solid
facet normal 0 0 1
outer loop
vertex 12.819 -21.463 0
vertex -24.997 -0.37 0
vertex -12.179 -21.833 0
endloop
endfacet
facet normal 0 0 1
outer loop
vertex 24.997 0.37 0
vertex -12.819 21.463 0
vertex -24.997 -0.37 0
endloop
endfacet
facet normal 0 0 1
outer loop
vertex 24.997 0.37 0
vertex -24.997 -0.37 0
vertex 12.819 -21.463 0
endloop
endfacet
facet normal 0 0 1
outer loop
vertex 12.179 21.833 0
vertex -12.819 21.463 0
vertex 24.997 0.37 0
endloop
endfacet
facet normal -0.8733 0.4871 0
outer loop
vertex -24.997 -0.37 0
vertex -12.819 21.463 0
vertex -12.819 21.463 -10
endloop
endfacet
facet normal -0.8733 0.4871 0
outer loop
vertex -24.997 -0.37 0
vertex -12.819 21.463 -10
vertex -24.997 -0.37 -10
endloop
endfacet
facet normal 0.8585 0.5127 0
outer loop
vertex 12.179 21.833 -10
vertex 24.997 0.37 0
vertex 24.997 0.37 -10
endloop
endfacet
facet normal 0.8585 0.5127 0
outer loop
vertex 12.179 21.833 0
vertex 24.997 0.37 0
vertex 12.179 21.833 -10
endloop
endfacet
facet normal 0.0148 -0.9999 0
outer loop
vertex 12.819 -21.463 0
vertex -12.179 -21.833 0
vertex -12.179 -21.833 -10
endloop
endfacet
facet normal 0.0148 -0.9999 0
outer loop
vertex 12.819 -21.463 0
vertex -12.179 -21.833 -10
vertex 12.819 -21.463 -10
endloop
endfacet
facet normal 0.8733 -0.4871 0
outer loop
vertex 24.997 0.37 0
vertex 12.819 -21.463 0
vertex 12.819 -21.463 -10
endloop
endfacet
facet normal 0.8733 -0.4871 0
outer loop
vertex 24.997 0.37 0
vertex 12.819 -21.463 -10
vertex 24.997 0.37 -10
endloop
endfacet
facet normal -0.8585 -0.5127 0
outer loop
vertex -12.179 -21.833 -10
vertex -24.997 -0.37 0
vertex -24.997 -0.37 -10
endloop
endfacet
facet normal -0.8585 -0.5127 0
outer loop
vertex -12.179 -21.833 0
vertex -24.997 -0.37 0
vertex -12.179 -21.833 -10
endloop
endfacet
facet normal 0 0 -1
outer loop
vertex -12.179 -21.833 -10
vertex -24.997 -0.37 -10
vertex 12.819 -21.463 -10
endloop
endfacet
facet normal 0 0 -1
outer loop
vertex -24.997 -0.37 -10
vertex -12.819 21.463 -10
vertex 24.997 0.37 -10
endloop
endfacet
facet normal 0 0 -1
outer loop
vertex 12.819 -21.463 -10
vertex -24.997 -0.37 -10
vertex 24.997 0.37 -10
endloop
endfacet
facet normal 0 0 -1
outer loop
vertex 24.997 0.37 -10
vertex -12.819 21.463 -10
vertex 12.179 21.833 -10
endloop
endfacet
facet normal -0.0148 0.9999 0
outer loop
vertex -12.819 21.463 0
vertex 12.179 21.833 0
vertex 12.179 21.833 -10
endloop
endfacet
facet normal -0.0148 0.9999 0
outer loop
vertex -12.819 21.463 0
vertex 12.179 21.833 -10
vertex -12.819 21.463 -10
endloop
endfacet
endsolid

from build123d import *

# Parameters (mm, degrees)
F1_DEPTH = 10


with BuildPart() as f1:
    # F0 (on Top) → F1 (new body)
    with BuildSketch(Plane.XY):
        Polygon((24.997267, 0.369631), (12.178524, 21.833084), (-12.818743, 21.463453), (-24.997267, -0.369631), (-12.178524, -21.833084), (12.818743, -21.463453), align=None)
    extrude(amount=-F1_DEPTH)


solid = f1.part
